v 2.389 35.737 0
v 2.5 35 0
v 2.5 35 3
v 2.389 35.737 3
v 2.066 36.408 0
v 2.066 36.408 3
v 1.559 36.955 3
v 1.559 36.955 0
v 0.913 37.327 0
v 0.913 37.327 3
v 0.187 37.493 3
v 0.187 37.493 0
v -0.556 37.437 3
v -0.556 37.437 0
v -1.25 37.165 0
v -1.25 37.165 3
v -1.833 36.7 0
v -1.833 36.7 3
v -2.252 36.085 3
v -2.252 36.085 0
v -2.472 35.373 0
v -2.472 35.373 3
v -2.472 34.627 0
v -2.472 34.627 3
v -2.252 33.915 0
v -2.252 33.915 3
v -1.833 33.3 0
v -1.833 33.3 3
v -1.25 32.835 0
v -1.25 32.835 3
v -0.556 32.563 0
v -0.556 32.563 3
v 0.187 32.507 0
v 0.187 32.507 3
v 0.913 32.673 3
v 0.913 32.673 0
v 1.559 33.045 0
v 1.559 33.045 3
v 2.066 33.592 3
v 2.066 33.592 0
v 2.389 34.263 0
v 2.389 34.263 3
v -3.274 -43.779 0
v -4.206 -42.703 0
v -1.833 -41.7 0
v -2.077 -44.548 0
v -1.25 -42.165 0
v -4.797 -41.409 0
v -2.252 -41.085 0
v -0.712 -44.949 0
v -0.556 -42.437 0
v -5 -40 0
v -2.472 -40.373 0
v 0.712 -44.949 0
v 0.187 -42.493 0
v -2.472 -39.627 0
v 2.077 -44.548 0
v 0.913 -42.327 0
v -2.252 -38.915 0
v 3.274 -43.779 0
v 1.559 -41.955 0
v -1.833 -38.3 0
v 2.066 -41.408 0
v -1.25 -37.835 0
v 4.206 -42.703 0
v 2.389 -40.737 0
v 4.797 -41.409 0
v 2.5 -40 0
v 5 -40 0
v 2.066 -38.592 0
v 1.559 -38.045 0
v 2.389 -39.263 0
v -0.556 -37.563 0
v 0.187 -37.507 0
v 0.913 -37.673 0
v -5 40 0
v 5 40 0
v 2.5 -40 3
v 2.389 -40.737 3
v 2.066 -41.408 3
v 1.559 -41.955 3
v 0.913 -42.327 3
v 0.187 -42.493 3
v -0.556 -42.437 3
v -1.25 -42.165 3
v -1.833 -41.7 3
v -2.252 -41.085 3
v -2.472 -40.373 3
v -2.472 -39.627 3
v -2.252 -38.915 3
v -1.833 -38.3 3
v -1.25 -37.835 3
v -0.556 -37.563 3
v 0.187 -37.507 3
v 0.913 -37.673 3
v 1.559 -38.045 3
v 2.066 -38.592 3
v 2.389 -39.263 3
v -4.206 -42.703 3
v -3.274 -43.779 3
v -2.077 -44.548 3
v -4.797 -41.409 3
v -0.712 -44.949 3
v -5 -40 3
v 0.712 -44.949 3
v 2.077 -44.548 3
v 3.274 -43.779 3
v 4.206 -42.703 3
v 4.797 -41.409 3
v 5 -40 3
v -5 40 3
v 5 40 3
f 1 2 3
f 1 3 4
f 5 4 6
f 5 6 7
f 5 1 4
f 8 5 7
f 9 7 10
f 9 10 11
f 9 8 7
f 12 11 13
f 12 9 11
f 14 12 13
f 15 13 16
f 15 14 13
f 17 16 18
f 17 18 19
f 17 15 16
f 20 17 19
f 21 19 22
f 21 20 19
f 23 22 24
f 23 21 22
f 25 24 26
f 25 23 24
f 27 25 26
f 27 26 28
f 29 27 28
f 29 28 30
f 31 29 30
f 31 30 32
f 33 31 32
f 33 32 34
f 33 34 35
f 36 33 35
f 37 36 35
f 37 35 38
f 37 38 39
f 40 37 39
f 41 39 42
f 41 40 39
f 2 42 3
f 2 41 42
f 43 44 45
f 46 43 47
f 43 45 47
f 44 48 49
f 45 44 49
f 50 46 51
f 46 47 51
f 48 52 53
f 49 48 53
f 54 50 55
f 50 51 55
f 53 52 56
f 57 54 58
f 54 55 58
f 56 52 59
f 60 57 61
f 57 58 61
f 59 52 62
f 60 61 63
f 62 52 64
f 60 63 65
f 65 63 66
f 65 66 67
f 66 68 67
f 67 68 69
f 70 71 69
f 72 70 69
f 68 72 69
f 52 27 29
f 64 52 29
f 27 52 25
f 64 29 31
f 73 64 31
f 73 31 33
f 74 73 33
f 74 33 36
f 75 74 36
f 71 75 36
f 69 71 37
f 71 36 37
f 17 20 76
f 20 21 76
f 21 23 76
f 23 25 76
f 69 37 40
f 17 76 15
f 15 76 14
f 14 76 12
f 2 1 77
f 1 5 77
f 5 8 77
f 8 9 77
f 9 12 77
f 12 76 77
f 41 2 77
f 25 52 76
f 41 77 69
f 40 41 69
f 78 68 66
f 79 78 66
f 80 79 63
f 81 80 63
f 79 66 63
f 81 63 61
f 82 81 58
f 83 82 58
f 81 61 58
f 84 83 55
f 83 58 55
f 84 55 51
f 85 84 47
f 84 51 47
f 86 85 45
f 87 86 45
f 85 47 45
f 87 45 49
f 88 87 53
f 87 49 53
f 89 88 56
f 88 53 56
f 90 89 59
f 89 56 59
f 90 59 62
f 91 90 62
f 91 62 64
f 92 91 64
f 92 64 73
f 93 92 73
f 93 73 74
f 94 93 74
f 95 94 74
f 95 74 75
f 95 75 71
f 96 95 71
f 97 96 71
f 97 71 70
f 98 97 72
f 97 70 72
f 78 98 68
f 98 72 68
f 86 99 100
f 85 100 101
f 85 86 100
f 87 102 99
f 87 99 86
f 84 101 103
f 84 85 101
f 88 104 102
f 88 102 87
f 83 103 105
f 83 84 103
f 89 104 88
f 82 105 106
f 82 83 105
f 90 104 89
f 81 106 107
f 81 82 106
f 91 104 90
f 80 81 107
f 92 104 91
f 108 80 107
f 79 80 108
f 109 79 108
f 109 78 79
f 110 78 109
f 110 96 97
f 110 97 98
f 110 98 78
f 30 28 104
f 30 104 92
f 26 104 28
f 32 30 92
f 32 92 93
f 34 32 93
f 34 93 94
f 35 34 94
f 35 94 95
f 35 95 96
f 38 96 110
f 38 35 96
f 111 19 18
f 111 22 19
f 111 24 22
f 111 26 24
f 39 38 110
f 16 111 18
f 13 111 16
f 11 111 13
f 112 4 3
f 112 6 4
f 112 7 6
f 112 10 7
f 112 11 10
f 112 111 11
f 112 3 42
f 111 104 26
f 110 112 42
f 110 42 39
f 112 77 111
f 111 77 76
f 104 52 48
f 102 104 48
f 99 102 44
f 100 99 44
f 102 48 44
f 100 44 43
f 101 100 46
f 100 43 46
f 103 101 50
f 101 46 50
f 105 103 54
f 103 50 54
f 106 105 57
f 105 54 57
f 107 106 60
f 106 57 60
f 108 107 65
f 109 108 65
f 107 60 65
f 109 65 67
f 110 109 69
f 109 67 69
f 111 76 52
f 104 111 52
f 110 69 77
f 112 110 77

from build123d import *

# Parameters (mm, degrees)
F0_R     = 2.5
F1_DEPTH = 3


with BuildPart() as f1:
    # F0 (on Top) → F1 (new body)
    with BuildSketch(Plane.XY):
        with BuildLine():
            ThreePointArc((-2.5, -40), (0, -37.5), (2.5, -40))
            Line((2.5, -40), (5, -40))
            Line((5, -40), (5, 40))
            Line((5, 40), (-5, 40))
            Line((-5, 40), (-5, -40))
            Line((-5, -40), (-2.5, -40))
        make_face()
        with Locations((0, 35)):
            Circle(F0_R, mode=Mode.SUBTRACT)
        with BuildLine():
            Line((5, -40), (2.5, -40))
            ThreePointArc((2.5, -40), (0, -42.5), (-2.5, -40))
            Line((-2.5, -40), (-5, -40))
            ThreePointArc((-5, -40), (0, -45), (5, -40))
        make_face()
    extrude(amount=F1_DEPTH)


solid = f1.part
